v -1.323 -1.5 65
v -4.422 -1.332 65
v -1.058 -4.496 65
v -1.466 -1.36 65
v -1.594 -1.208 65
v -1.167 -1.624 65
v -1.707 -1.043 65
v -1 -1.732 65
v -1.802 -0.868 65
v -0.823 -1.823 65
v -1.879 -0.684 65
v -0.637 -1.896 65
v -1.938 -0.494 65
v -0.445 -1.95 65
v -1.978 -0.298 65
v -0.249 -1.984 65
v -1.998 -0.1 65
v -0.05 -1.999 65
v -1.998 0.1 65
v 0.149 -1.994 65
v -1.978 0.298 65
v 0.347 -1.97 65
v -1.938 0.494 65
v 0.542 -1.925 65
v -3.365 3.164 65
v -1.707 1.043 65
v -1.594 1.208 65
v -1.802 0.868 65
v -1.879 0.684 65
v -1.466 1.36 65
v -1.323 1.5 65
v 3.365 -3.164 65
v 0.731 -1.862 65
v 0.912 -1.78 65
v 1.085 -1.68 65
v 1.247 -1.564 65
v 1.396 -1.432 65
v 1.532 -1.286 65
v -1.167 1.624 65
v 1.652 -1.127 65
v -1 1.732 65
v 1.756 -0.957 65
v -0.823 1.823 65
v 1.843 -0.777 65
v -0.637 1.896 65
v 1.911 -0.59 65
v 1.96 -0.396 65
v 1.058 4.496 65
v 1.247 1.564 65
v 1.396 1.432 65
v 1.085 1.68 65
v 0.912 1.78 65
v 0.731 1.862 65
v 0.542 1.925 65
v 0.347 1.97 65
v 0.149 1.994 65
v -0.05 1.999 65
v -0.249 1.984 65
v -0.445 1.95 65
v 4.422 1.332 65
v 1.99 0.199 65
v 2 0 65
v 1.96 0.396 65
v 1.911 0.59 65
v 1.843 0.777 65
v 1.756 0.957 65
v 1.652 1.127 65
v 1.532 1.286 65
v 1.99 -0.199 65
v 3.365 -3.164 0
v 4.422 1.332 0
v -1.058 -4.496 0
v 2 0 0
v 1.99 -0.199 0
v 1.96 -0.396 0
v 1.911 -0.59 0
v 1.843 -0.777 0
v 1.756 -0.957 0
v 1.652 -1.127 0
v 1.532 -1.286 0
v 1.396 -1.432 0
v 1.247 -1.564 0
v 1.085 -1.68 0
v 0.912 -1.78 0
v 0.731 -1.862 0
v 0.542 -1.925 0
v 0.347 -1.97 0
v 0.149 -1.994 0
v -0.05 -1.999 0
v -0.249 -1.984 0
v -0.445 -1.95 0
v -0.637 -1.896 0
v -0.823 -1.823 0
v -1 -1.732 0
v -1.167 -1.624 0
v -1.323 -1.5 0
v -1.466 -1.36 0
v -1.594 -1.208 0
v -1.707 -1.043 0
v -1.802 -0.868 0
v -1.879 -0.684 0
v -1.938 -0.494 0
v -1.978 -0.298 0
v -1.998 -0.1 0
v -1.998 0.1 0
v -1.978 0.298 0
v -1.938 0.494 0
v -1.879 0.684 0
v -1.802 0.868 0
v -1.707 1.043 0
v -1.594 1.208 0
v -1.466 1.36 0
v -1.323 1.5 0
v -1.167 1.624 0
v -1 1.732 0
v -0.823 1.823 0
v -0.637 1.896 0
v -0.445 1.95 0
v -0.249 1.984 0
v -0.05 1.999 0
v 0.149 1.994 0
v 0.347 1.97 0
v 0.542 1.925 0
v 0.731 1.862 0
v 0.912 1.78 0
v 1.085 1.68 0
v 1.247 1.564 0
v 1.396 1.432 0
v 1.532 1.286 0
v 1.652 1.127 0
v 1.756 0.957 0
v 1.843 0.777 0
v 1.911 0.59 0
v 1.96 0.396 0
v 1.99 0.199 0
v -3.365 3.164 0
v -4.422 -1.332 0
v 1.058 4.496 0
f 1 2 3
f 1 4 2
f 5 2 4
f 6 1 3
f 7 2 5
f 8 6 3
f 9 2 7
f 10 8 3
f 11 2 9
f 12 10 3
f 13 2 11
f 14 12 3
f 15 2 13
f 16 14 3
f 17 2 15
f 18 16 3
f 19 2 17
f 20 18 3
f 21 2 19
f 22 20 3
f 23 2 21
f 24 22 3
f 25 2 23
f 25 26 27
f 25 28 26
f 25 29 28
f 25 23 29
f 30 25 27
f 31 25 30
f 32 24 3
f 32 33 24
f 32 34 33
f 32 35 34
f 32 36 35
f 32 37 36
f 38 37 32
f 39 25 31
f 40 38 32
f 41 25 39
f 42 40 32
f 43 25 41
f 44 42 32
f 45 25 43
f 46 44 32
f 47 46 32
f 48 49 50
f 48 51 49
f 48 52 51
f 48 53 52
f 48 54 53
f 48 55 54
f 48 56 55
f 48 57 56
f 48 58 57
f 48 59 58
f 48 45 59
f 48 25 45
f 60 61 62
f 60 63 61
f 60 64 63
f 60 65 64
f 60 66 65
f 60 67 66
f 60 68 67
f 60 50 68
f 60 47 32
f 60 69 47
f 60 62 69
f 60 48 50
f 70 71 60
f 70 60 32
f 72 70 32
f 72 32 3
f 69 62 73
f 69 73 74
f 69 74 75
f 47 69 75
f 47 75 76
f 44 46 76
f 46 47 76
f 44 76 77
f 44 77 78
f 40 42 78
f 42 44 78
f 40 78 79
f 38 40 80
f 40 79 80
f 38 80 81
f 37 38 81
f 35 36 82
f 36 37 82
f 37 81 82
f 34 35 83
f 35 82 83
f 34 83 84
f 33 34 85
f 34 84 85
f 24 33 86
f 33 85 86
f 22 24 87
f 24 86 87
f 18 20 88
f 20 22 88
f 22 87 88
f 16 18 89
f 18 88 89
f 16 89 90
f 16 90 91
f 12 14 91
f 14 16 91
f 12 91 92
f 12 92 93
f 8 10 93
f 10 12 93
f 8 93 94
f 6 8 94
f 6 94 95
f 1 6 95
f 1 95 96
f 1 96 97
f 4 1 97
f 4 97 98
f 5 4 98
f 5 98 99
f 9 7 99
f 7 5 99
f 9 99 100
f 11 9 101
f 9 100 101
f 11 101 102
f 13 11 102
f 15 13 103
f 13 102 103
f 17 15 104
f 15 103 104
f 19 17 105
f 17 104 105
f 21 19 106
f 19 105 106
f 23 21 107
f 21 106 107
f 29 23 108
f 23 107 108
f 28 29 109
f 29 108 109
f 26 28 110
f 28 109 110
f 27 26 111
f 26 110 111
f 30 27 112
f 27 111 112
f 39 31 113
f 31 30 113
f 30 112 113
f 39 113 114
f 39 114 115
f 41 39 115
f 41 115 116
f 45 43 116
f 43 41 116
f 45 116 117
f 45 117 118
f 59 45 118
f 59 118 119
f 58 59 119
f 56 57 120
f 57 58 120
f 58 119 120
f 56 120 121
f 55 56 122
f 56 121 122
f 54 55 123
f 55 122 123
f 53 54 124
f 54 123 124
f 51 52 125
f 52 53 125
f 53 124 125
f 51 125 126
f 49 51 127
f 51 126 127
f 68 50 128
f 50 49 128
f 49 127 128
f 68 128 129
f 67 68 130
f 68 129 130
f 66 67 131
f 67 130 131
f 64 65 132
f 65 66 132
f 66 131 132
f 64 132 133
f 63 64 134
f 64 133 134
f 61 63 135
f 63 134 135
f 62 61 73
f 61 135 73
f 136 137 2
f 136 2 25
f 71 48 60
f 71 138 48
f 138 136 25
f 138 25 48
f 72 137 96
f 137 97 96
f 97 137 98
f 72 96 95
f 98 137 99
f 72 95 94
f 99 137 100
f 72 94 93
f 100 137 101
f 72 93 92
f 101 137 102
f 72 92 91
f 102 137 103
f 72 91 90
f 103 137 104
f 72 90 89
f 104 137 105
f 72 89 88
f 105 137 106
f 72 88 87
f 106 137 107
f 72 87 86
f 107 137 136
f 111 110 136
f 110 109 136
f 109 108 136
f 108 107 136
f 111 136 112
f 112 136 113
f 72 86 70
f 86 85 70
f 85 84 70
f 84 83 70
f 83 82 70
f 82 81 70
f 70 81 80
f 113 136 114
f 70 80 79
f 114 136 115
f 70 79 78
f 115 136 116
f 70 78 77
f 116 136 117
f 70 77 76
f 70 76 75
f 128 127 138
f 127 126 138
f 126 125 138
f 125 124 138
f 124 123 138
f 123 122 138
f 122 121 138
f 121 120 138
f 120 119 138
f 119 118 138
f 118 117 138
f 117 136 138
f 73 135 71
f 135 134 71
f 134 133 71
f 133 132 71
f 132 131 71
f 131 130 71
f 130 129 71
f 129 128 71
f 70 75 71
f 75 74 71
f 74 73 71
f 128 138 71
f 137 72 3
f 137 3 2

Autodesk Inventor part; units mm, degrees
ref_plane "YZ Plane" through (0, 0, 0) normal (1, 0, 0) x (0, 1, 0)
ref_plane "XZ Plane" through (0, 0, 0) normal (0, 1, 0) x (-1, 0, 0)
ref_plane "XY Plane" through (0, 0, 0) normal (0, 0, 1) x (1, 0, 0)
sketch "Эскиз1" plane through (0, 0, 0) normal (0, 0, 1) x (1, 0, 0)
  line L0 (4.4225, 1.3322) -> (3.365, -3.1639)
  line L1 (3.365, -3.1639) -> (-1.0575, -4.4961)
  line L2 (-1.0575, -4.4961) -> (-4.4225, -1.3322)
  line L3 (-4.4225, -1.3322) -> (-3.365, 3.1639)
  line L4 (-3.365, 3.1639) -> (1.0575, 4.4961)
  line L5 (1.0575, 4.4961) -> (4.4225, 1.3322)
  circle A0 centre (0, 0) radius 2
  point P0 (-1.1537, 3.83)
  dimension "d0" = 8
  dimension "d1" = 7.66
  dimension "d2" = 4
extrude "Выдавливание1" add sketch "Эскиз1" along normal blind 65
properties part number "стойка"
